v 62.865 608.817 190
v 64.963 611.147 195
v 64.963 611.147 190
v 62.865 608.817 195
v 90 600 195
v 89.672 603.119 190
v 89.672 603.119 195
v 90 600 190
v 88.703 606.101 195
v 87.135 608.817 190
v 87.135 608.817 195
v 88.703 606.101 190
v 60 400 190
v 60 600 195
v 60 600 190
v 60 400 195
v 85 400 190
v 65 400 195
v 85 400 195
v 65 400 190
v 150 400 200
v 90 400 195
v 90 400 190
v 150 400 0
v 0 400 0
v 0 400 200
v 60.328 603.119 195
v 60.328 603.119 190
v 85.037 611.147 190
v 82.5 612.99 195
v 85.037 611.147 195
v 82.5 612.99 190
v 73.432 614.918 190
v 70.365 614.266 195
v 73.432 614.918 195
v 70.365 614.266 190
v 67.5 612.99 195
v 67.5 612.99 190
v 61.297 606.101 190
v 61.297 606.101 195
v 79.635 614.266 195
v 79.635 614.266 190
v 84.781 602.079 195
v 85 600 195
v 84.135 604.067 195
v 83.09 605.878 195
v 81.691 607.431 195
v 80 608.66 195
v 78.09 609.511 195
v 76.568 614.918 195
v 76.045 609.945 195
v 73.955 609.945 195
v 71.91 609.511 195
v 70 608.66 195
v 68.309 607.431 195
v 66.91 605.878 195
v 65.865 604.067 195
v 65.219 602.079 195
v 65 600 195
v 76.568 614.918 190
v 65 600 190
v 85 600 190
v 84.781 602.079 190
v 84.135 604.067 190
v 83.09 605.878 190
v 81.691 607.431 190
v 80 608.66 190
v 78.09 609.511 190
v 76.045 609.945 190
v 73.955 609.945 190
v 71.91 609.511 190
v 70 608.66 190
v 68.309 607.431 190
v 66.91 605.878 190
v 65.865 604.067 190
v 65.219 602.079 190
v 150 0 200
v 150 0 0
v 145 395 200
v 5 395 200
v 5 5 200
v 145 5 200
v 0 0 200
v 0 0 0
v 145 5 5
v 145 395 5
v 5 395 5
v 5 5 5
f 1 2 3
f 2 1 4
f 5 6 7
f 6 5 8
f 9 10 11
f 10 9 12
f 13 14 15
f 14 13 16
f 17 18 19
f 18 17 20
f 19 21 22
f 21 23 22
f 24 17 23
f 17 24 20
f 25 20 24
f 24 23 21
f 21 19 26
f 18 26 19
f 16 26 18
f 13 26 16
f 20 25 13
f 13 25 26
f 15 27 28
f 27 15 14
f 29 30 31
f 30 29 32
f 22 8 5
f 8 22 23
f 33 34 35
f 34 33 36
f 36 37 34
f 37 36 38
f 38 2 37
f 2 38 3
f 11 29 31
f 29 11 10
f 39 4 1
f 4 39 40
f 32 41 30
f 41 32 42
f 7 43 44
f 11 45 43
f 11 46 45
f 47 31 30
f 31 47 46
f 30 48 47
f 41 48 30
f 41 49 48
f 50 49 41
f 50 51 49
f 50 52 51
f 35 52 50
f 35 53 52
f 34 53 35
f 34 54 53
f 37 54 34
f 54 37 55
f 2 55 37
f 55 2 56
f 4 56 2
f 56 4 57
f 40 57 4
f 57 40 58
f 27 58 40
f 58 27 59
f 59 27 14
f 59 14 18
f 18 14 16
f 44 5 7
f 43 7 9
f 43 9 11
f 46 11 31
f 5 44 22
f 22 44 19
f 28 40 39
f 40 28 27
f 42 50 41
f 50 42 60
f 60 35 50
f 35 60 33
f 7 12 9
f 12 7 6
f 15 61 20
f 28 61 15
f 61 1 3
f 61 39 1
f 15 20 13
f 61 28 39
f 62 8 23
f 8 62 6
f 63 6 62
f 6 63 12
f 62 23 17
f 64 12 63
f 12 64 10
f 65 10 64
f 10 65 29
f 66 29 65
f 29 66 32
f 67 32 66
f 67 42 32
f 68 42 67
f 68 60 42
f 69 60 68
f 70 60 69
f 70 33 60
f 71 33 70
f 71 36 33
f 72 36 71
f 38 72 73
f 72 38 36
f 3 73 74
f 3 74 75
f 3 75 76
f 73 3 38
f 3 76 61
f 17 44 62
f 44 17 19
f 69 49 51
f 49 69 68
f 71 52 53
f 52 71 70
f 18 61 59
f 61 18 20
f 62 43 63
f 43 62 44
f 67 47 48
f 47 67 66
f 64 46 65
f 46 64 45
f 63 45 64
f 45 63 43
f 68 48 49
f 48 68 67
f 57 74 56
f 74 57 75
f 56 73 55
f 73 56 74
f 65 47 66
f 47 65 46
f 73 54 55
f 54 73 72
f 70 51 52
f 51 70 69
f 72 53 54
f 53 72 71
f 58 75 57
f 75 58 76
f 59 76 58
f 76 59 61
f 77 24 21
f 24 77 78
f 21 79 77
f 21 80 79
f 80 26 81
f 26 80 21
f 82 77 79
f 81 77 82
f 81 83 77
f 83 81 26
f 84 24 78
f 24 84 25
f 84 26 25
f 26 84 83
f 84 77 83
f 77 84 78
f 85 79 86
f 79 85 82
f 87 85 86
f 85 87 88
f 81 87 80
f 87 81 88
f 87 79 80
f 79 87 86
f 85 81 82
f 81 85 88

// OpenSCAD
//basket

R280_basket();
module R280_basket(){
    w=150;
    d=400;
    h=200;
    ew=30;
    el=200;
    color("dimgray"){
difference(){
hull(){
    translate([w/2, d+el, h-10]) cylinder(h=5, r=ew/2);
    translate([(w/2)-ew/2, d, h-10]) cube([ew,el-10,5]);
}
hull(){
    translate([w/2, d+el, h-10]) cylinder(h=5, r=-5+ew/2);
    translate([5+(w/2)-ew/2, d, h-13]) cube([ew-10,el,10]);
}
}
difference(){
    cube([w,d,h]);
    translate([5,5,5])cube([w-5*2,d-5*2,h^5*2]);
}
}
}
